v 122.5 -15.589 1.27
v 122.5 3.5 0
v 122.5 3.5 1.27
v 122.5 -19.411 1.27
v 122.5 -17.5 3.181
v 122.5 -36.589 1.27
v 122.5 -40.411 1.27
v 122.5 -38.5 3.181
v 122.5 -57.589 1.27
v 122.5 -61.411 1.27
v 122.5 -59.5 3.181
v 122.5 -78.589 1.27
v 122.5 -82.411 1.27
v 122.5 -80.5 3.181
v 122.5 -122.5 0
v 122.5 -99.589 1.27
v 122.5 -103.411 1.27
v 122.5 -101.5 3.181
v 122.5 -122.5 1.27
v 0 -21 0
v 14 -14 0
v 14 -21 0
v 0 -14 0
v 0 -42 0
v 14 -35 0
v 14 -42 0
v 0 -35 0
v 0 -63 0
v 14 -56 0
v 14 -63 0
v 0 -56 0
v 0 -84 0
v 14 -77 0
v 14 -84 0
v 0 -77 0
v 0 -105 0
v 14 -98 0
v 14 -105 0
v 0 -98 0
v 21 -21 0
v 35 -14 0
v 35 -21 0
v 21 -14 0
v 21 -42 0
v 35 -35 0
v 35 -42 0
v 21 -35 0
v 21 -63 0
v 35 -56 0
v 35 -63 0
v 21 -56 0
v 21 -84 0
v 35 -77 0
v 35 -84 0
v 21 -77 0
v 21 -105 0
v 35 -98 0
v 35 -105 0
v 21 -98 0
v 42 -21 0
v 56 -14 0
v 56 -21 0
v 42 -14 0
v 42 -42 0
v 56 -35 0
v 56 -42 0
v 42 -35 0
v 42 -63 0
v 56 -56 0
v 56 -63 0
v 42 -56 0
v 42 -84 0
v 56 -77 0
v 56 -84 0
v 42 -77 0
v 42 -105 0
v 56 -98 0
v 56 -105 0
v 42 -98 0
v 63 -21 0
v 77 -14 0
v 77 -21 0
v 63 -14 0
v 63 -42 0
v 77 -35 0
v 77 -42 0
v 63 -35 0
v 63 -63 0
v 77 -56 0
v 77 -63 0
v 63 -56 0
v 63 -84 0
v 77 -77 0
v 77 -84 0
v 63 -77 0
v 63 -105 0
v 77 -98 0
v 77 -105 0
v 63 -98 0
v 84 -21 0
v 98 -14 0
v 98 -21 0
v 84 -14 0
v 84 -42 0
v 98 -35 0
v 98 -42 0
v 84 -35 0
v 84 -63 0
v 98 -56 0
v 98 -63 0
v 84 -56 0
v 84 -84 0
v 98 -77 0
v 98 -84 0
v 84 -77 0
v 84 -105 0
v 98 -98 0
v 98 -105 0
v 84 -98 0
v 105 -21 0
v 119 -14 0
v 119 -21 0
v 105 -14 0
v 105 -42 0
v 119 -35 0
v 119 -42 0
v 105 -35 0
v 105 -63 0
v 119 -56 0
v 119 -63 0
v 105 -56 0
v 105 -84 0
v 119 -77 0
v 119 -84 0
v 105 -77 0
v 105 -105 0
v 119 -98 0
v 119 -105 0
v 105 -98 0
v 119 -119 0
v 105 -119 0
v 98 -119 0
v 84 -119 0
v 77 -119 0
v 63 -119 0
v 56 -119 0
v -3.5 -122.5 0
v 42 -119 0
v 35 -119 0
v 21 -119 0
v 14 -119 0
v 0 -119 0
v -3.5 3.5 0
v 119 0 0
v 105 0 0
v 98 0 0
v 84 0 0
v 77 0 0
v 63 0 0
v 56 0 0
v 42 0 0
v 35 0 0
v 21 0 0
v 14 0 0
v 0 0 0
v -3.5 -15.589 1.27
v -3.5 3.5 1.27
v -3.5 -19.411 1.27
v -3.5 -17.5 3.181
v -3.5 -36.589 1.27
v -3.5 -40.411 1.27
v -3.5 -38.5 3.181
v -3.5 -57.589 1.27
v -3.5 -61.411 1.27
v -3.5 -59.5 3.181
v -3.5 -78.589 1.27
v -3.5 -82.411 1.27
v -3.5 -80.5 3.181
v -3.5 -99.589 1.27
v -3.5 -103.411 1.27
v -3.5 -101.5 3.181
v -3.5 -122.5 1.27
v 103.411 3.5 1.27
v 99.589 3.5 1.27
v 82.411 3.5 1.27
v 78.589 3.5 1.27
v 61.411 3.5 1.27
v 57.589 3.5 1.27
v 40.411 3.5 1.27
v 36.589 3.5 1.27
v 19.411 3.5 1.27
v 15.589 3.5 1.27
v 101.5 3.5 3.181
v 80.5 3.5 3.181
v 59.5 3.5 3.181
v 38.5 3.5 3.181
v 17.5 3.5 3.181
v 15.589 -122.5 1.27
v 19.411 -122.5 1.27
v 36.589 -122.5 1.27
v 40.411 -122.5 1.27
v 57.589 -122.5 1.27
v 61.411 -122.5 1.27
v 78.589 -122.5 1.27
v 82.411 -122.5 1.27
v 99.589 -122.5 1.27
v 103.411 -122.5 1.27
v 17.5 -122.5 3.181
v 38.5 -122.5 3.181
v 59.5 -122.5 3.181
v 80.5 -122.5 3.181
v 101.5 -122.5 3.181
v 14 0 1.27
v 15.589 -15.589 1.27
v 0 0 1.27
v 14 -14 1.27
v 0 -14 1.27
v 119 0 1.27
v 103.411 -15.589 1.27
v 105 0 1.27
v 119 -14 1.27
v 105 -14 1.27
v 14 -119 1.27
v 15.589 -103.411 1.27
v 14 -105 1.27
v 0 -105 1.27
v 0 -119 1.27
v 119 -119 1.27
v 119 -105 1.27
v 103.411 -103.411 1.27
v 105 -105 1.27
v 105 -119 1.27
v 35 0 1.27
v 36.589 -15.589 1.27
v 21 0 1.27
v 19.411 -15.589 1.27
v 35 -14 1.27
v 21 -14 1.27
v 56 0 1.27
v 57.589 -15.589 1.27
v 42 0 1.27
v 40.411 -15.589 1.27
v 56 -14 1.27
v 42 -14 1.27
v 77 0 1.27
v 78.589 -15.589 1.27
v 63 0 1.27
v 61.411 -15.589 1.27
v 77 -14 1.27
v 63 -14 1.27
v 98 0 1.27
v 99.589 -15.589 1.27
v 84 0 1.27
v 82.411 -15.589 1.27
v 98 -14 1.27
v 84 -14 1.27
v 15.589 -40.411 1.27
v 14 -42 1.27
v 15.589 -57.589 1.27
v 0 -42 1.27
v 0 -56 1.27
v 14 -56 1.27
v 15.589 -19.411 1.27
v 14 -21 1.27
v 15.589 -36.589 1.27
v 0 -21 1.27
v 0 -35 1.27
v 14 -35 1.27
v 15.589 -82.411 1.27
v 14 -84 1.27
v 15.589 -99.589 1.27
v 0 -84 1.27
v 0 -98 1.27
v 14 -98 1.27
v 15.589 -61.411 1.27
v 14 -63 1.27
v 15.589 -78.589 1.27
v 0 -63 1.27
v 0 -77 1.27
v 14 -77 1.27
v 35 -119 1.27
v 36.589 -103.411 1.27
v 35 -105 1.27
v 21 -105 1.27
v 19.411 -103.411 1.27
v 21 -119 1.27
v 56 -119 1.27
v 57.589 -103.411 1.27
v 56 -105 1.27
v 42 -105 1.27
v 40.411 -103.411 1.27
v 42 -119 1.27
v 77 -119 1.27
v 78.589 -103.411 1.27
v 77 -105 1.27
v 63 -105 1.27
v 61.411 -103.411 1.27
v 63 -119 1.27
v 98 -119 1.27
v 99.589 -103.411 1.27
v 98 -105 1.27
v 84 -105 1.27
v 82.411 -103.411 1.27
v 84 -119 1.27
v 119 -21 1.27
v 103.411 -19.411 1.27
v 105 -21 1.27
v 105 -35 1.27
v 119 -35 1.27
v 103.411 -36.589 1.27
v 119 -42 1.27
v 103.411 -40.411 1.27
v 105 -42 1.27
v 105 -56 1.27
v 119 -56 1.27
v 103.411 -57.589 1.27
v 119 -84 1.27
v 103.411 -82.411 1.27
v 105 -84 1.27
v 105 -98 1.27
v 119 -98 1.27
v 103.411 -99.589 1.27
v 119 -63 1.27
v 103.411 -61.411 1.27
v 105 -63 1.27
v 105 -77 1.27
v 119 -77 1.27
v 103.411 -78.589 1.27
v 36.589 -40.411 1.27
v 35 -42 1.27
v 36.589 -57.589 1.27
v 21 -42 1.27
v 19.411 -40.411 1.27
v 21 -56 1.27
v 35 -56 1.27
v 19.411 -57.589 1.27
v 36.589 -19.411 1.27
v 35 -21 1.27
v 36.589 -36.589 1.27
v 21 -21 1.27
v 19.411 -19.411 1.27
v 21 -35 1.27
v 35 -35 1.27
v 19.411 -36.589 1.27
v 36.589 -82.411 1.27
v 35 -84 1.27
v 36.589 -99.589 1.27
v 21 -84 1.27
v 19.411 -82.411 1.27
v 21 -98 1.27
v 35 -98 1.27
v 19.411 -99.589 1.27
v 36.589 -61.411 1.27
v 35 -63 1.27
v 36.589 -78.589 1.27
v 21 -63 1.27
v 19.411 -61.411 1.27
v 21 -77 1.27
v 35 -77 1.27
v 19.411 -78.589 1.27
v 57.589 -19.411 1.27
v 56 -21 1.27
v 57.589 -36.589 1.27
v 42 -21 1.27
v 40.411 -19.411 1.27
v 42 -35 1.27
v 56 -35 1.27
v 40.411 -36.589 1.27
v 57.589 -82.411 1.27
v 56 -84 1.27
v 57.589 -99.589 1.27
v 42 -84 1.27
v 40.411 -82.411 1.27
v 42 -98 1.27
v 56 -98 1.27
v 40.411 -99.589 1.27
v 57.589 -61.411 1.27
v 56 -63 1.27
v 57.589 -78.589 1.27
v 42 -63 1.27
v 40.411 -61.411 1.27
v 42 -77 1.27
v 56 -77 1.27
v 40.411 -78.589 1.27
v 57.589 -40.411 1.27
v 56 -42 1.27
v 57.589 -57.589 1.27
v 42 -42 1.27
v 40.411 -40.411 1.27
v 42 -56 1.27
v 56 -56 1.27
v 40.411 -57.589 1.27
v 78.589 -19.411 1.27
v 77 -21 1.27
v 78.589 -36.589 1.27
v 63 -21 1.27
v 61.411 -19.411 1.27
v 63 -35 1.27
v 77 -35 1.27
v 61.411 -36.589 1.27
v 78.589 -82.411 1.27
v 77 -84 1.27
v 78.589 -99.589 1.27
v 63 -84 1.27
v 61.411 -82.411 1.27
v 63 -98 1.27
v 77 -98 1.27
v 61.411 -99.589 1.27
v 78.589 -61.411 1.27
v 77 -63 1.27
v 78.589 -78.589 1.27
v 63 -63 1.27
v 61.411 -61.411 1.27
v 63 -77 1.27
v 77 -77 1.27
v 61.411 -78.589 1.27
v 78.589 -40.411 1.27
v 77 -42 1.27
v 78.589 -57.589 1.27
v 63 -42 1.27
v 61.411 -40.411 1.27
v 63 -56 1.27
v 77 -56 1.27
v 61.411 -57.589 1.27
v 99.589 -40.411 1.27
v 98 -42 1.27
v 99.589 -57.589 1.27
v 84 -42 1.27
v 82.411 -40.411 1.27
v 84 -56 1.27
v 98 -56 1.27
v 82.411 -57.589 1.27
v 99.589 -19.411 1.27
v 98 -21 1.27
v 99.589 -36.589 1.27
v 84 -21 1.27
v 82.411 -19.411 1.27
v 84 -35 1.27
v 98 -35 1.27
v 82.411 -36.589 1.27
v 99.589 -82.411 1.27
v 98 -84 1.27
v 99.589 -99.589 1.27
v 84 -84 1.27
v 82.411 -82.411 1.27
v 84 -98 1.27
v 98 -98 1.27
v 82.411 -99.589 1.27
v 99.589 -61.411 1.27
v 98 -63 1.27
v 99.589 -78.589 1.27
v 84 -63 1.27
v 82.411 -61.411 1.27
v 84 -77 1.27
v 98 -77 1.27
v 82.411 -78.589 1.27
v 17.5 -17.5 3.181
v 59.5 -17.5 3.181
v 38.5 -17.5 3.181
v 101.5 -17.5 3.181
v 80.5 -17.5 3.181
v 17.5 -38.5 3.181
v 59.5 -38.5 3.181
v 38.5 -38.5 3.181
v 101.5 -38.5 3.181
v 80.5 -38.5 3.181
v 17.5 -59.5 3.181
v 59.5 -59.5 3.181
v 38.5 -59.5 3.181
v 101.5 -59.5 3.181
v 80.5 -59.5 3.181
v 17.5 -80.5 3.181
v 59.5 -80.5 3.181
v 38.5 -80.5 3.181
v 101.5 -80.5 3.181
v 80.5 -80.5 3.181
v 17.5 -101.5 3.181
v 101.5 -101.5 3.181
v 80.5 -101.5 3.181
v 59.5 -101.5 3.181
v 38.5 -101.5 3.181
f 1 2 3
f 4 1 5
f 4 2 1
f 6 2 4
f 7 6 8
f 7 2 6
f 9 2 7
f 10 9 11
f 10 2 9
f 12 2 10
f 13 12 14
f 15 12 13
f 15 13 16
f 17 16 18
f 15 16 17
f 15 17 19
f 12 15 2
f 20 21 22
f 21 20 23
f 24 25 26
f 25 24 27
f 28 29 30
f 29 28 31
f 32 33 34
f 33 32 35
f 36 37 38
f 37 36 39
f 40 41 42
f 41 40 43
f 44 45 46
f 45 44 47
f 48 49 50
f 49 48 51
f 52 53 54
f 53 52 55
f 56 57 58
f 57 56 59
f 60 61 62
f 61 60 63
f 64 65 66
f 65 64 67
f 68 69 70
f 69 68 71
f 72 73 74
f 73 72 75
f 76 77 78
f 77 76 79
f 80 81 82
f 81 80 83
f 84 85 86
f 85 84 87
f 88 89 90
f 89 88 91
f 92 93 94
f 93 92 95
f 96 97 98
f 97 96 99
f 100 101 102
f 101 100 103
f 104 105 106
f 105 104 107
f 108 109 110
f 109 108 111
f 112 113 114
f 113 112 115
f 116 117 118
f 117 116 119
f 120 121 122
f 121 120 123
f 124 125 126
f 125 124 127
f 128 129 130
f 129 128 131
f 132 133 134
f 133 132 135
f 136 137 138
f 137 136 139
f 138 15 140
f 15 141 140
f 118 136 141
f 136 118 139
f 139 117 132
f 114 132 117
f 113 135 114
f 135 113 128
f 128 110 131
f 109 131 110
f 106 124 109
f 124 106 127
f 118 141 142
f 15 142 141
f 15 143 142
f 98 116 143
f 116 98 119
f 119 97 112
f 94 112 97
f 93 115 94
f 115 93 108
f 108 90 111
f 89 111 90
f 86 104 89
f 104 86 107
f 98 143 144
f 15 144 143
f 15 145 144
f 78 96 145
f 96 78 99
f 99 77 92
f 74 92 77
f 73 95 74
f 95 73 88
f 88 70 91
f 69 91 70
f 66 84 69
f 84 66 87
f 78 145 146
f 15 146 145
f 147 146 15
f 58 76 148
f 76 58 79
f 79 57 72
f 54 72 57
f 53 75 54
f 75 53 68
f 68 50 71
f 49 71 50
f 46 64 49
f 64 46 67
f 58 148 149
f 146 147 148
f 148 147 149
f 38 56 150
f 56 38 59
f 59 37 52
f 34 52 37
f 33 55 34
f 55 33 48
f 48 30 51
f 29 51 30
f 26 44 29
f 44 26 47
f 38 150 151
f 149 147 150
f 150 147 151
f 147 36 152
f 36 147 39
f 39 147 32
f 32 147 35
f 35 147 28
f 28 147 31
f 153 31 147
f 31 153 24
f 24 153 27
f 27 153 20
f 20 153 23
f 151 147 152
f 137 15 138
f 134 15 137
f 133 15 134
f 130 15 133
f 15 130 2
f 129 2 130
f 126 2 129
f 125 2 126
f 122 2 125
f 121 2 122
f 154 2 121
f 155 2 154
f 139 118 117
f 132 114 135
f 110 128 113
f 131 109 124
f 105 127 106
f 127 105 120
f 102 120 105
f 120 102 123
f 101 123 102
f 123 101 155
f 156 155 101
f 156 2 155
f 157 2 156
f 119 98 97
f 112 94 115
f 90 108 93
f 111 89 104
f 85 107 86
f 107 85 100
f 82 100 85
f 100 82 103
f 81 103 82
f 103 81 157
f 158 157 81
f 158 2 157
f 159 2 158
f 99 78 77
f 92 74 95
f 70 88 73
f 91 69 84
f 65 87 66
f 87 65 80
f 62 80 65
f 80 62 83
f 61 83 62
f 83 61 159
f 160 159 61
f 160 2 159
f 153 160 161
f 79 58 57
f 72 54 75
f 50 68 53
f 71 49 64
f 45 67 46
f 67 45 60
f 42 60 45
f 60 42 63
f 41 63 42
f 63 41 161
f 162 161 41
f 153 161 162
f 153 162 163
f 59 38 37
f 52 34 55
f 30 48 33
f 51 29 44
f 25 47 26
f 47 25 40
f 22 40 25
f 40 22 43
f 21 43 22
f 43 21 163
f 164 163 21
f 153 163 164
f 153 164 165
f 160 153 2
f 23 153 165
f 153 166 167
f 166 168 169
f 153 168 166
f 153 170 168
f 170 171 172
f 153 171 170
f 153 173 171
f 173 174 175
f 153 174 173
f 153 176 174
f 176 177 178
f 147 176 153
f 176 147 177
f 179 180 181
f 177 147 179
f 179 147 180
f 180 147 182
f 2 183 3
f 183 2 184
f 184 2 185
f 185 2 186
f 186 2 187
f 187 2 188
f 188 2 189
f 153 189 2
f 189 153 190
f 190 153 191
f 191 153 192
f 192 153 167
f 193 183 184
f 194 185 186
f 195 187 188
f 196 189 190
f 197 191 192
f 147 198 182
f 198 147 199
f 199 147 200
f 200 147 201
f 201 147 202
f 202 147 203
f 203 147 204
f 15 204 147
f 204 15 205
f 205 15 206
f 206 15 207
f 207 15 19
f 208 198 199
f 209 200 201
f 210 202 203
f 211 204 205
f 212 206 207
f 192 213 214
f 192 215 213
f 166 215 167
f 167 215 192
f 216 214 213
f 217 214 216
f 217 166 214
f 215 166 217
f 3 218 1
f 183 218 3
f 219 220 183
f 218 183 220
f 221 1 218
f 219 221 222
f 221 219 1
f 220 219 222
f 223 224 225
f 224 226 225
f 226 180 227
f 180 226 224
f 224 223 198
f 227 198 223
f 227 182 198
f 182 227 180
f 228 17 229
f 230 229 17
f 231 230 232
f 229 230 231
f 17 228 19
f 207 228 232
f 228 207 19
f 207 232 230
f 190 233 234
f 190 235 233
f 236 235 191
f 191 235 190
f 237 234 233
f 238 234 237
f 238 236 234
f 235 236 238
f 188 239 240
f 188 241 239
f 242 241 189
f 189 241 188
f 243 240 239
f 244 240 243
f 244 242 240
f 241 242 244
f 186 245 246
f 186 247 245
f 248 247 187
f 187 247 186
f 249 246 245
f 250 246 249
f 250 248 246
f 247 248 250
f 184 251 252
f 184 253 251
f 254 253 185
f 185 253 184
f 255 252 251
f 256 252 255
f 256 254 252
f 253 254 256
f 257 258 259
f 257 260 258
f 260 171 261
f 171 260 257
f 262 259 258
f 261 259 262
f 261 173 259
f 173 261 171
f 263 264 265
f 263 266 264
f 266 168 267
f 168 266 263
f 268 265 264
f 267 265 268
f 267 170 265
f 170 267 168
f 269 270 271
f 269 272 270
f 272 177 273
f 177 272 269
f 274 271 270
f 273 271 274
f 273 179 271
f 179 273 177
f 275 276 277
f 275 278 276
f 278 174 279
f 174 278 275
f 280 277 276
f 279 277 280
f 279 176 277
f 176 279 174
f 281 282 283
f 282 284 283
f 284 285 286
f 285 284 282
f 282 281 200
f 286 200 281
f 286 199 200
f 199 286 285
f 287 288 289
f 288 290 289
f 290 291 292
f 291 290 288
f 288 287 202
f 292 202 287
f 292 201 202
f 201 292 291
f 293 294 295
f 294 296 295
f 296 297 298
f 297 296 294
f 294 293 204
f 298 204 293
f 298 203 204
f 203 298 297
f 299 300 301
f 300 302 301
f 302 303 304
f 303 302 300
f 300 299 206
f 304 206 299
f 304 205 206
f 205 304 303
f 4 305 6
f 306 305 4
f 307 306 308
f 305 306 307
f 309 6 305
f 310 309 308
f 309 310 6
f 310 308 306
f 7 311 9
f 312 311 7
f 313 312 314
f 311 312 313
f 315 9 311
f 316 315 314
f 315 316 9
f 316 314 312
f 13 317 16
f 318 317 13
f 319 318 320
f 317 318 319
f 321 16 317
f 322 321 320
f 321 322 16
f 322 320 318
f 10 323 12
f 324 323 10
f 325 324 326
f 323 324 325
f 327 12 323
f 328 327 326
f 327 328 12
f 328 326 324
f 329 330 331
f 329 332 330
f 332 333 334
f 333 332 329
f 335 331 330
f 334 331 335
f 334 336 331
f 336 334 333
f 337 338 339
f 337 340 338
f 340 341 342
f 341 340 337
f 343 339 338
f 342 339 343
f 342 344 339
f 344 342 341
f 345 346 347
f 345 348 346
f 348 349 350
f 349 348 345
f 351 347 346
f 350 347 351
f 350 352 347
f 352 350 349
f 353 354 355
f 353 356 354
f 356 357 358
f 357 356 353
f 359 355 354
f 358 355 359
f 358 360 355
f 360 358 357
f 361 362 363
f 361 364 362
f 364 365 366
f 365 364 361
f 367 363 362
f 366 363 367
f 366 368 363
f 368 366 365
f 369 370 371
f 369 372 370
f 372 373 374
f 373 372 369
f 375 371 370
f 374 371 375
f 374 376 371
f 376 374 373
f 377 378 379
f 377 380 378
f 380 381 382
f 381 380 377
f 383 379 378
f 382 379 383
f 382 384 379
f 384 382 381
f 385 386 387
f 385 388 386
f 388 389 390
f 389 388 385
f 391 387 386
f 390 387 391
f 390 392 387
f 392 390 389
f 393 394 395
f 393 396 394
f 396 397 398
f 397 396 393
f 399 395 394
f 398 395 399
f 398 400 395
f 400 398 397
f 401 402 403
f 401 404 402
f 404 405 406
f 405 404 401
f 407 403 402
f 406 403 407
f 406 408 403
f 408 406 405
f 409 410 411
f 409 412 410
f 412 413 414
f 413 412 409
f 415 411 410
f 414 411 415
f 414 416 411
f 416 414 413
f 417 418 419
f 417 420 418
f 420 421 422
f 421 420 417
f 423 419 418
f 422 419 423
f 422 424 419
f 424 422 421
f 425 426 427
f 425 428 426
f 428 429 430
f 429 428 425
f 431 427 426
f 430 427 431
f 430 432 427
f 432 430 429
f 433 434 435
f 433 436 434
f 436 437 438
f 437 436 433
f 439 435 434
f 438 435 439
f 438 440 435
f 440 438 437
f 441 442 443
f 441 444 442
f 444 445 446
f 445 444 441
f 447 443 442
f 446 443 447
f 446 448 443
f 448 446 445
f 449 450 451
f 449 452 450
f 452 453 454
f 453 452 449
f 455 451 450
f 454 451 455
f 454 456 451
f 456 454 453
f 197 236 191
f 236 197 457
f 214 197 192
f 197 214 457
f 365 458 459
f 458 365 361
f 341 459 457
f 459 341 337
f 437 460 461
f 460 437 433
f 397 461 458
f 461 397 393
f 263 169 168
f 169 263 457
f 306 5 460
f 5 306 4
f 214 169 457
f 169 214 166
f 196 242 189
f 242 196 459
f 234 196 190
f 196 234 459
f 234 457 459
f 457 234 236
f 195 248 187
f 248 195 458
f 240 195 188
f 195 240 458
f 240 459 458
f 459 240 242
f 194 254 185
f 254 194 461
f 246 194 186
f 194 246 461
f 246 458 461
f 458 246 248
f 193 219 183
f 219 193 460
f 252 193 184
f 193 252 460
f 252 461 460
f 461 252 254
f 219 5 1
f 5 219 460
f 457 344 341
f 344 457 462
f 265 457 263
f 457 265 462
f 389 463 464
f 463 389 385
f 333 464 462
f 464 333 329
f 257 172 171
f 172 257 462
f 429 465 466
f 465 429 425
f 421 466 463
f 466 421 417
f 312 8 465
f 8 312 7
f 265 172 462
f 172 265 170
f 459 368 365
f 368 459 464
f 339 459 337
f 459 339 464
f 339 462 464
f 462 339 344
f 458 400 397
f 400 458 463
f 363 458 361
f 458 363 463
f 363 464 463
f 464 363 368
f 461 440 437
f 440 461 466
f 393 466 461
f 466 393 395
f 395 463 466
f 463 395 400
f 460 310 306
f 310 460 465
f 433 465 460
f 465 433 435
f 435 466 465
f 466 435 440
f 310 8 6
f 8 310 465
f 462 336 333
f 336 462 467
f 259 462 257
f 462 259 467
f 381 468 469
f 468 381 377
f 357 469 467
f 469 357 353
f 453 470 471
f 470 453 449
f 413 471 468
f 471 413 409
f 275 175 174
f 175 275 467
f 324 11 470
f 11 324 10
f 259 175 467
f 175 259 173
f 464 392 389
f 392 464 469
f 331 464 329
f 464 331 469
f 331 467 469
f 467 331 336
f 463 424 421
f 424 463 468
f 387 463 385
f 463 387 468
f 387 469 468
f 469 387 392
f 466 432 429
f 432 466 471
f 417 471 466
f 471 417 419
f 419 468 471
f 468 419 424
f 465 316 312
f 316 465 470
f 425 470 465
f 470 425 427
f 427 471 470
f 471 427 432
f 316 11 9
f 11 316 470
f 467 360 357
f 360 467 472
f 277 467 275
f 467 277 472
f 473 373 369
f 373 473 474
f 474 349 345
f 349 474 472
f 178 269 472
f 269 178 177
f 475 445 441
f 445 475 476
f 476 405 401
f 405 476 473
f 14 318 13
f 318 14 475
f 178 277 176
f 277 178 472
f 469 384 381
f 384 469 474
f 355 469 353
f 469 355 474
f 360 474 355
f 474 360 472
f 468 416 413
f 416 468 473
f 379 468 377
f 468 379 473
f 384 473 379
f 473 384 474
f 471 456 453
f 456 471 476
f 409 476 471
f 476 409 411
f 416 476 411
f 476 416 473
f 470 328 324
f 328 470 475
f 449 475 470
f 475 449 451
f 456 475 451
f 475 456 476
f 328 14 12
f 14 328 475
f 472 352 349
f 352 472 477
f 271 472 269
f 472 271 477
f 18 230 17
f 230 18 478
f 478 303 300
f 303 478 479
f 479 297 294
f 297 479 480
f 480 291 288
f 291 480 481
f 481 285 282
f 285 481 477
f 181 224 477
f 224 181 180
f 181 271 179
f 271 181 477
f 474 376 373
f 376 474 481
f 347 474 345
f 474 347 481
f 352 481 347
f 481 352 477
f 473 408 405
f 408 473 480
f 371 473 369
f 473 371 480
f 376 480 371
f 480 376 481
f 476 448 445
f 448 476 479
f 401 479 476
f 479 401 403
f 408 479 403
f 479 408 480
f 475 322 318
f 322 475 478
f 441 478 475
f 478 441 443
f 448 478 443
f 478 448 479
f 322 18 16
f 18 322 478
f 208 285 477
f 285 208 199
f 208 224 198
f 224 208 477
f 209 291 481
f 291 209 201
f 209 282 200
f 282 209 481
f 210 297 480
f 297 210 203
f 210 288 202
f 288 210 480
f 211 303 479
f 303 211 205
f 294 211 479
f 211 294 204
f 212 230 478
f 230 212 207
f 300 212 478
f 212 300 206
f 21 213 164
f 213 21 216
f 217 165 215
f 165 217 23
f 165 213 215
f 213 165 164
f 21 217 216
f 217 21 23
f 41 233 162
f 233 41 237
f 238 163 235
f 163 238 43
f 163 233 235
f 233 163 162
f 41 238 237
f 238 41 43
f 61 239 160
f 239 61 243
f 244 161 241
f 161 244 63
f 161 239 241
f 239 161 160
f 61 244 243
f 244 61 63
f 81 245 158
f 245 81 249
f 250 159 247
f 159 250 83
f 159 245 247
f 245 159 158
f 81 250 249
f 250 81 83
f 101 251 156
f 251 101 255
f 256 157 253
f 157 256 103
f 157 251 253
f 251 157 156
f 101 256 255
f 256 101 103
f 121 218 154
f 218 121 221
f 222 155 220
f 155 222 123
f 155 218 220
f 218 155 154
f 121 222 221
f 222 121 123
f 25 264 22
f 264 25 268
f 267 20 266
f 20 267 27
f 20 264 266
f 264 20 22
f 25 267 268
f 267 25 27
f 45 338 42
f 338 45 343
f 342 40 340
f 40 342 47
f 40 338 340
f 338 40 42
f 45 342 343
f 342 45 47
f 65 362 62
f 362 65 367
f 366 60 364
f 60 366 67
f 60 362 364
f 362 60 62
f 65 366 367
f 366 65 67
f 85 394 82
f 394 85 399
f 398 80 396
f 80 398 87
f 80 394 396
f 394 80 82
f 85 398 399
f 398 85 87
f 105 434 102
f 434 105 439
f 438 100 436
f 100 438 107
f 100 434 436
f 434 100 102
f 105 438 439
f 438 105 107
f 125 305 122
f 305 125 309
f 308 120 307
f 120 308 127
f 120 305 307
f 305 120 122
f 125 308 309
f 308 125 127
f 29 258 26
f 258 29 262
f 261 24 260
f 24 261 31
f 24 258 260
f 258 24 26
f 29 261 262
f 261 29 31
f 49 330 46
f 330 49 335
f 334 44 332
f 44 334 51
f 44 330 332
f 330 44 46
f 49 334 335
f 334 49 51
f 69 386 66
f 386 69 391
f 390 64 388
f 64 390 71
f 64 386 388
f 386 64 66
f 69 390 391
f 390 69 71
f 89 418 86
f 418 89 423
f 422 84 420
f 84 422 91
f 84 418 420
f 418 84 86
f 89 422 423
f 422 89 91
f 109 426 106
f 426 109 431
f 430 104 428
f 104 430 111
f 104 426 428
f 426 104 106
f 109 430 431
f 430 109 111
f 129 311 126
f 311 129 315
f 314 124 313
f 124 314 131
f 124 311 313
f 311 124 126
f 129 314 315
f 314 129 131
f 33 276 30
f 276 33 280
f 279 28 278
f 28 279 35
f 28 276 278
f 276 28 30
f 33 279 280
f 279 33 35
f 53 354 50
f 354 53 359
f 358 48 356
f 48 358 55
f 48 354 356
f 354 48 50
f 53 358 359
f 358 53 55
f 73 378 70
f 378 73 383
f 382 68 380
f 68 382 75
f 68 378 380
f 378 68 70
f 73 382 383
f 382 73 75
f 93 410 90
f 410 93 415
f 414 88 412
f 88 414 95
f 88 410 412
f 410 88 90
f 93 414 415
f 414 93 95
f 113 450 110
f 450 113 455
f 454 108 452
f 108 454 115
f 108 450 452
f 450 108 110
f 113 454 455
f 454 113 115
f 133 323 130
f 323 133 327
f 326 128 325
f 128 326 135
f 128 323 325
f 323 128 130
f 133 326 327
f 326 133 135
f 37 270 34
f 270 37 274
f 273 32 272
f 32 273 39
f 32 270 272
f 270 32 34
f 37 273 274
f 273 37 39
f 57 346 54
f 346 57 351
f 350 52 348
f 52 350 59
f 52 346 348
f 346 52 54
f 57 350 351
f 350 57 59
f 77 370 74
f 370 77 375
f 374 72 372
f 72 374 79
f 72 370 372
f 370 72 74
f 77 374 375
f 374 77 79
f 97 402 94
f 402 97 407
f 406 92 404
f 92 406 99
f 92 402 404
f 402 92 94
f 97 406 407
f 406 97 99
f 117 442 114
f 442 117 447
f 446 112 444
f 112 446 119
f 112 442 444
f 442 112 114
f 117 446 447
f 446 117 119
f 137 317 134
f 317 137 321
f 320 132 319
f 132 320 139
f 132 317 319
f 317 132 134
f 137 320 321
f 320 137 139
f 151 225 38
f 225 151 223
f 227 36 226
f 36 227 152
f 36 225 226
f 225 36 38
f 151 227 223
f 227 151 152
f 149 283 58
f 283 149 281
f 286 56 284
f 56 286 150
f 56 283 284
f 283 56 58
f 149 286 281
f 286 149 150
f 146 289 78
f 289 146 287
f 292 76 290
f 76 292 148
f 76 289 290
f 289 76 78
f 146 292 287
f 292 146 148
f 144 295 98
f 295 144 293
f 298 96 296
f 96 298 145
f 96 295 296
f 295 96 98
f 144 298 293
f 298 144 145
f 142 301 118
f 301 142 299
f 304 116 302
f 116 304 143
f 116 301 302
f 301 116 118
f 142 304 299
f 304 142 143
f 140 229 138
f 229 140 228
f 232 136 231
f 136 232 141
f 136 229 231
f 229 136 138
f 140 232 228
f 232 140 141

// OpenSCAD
// file: grid_mods.scad
//-----------------------------------------
module grid_make(ii_gridW, ii_gridD){
	difference(){
		union(){
			grid_plate(ii_gridW, ii_gridD);
			translate([gn_gHoleW/2,-gn_gHoleD/2,0]){
				grid_support(ii_gridW, ii_gridD);
			}
		}
		translate([gn_gHoleW/2,-gn_gHoleD/2,0]){
			grid_keyHole(ii_gridW, ii_gridD);
		}
	}	
}
//-----------------------------------------
module grid_keyHole(ii_gridW, ii_gridD){
	
	ii_gridW = ii_gridW - 1;
	ii_gridD = ii_gridD - 1;
	color("orange")
	for(col=[0:1:ii_gridD]){
		for(row=[0:1:ii_gridW]){
			translate([
				row*(gn_gHoleW+gn_gSpaceBetweenW),
				-col*(gn_gHoleW+gn_gSpaceBetweenD),
				0]){
				cube([gn_gHoleW,gn_gHoleD,gn_gHoleH],center=true);
			}
		}
	}
}
//-----------------------------------------
module grid_support(ii_gridW, ii_gridD){
	ii_gridW = ii_gridW - 1;
	ii_gridD = ii_gridD - 1;
	for(col=[0:1:ii_gridD]){
		for(row=[0:1:ii_gridW]){
			translate([
				row*(gn_gHoleW+gn_gSpaceBetweenW),
				-col*(gn_gHoleW+gn_gSpaceBetweenD),
				0]){
				if(row != ii_gridW){
					translate([(gn_gHoleW+gn_gSpaceBetweenW)/2,0,0])
						rotate([0,0,90])
						trangleSupport(gn_gHoleW+gn_gSpaceBetweenD);
				}
				if(col != ii_gridD){
					translate([0,-(gn_gHoleD+gn_gSpaceBetweenD)/2,0])
						trangleSupport(gn_gHoleW+gn_gSpaceBetweenW);
				}
			}
		}
	}

}
//-----------------------------------------
module grid_plate(ii_gridW, ii_gridD){

	wi_colW = ((ii_gridW*gn_gHoleW)+((ii_gridW)*gn_gSpaceBetweenW));
	wi_rowD = ((ii_gridD*gn_gHoleD)+((ii_gridD)*gn_gSpaceBetweenD));
//  color("green") 
		translate([
			 (wi_colW/2)-(gn_gSpaceBetweenW/2),
			-(wi_rowD/2)+(gn_gSpaceBetweenD/2),0]){
    translate([0,0,.5]) cube([wi_colW,wi_rowD,1], center=true);
    translate([0,0,.77]) cube([wi_colW,wi_rowD,1], center=true);
  }
}
//-----------------------------------------
module testGrid(){
  cube([14,1000,5],center=true);
  for(a=[1:1:5]){
    translate([a*21,0,0])
      cube([14,1000,5],center=true);
  }
  for(a=[1:1:5]){
    translate([a*-21,0,0])
      cube([14,1000,5],center=true);
  }
}
//-----------------------------------------
module trangleSupport(iLen){
  difference(){
    translate([0,0,1.06])
      rotate([45,0,0])
      cube([iLen,3,3],center=true);
    translate([0,0,-.5])
      cube([iLen+1,6,3], center=true);
  }
}
//-----------------------------------------
module grid_outterplate(in_width){
	difference(){
		union(){
			hull(){
				translate([-in_width,0,0])
					grid_outterplate_tabCore();
				translate([in_width,0,0])
					rotate([0,0,180])
					grid_outterplate_tabCore();
			}
			translate([-in_width,0,0])
				grid_outterplate_tabTab();
			translate([in_width,0,0])
				rotate([0,0,180])
				grid_outterplate_tabTab();
		}
		translate([-in_width,0,0])
			grid_outterplate_tabCuts();
		translate([in_width,0,0])
			rotate([0,0,180])
			grid_outterplate_tabCuts();
	}
}
//-----------------------------------------
module grid_outterplate_tabCore(){
	// Outter Coners
	hull(){
		translate([5.5,-17.5,gn_mPlateZ])
		 cylinder(h=gn_plateZ,d=10,center=true);
		mirror([0,180,0])
			translate([5.5,-17.5,gn_mPlateZ])
			 cylinder(h=gn_plateZ,d=10,center=true);
	}
}
//-----------------------------------------
module grid_outterplate_tabTab(){
	hull(){
		translate([-.8,-1.4,gn_mPlateZ])
		 cylinder(h=gn_plateZ,d=7.1,center=true);
		mirror([0,180,0])
			translate([-.8,-1.4,gn_mPlateZ])
			 cylinder(h=gn_plateZ,d=7.1,center=true);
	}
// Sholder to be cut
	translate([-.42,0,gn_mPlateZ])
	cube([3,16.54,gn_plateZ],center=true);
}
//-----------------------------------------
module grid_outterplate_tabCuts(){
		//bolt hole
		 cylinder(h=4,d=3.2,center=true);
	// Radius Cutout Bump
		translate([-3.25,-8.26,gn_mPlateZ])
		 cylinder(h=gn_plateZ+1,d=7.5,center=true);
		mirror([0,180,0])
			translate([-3.25,-8.26,gn_mPlateZ])
			 cylinder(h=gn_plateZ+1,d=7.5,center=true);

}
//----------------------------------------------------------------------
module grid_outterplateCutKeys(in_Width, ia_og){
	difference(){
		grid_outterplate(in_Width);
		for(a=ia_og){
			gn_gSpaceBetweenD = a[3];
			gn_gSpaceBetweenW = a[4];
			translate([-a[6],a[5],-1])
				hull(){
				color(a[0])
					scale([.999,.999,2]) grid_make(a[1],a[2]);
				}
		}
	}
	for(a=ia_og){
		translate([-a[6],a[5],0])
			color(a[0])
			grid_make(a[1],a[2]);
	}
}
// file: grid_vars.scad
	gn_gHoleW = 14;
	gn_gHoleD = 14;
	gn_gHoleH = 10;

	gn_gSpaceBetweenW = 5.05;
	gn_gSpaceBetweenD = 5.05;
	
	gn_gSpaceAroundGridW = gn_gSpaceBetweenW/2;
	gn_gSpaceAroundGridD = gn_gSpaceBetweenD/2;

	gnc_gTotalGridW = 0;
	gnc_gTotalGridD = 0;
	
	gn_plateZ = 1.27;

	gn_mPlateZ = .635;
	
	
	
// main file
$fn=30;


include <grid_vars.scad>

echo(gn_gSpaceBetweenD);



//translate([7,-7,0]){
//	grid_keyHole(ti_gridW, ti_gridD);
//	grid_support(ti_gridW, ti_gridD);
//}
//	grid_plate(ti_gridW, ti_gridD);

gn_gSpaceBetweenD = 7;
gn_gSpaceBetweenW = 7;

	ti_gridW = 6;
	ti_gridD = 6;
grid_make(ti_gridW, ti_gridD);
/*
col1 = ti_gridW;
col2 = col1 - 1;

row1 = ti_gridD;
row2 = row1 - 1;
# 
translate([((col1*14)+(col2*5.05))/2,7,0])
	cube([(col1*14)+(col2*5.05),14,.00000001],center=true);
#
translate([-7,-((row1*14)+(row2*5.05))/2,0])
	cube([14,(row1*14)+(row2*5.05),.00000001],center=true);
*/

include <grid_mods.scad>
